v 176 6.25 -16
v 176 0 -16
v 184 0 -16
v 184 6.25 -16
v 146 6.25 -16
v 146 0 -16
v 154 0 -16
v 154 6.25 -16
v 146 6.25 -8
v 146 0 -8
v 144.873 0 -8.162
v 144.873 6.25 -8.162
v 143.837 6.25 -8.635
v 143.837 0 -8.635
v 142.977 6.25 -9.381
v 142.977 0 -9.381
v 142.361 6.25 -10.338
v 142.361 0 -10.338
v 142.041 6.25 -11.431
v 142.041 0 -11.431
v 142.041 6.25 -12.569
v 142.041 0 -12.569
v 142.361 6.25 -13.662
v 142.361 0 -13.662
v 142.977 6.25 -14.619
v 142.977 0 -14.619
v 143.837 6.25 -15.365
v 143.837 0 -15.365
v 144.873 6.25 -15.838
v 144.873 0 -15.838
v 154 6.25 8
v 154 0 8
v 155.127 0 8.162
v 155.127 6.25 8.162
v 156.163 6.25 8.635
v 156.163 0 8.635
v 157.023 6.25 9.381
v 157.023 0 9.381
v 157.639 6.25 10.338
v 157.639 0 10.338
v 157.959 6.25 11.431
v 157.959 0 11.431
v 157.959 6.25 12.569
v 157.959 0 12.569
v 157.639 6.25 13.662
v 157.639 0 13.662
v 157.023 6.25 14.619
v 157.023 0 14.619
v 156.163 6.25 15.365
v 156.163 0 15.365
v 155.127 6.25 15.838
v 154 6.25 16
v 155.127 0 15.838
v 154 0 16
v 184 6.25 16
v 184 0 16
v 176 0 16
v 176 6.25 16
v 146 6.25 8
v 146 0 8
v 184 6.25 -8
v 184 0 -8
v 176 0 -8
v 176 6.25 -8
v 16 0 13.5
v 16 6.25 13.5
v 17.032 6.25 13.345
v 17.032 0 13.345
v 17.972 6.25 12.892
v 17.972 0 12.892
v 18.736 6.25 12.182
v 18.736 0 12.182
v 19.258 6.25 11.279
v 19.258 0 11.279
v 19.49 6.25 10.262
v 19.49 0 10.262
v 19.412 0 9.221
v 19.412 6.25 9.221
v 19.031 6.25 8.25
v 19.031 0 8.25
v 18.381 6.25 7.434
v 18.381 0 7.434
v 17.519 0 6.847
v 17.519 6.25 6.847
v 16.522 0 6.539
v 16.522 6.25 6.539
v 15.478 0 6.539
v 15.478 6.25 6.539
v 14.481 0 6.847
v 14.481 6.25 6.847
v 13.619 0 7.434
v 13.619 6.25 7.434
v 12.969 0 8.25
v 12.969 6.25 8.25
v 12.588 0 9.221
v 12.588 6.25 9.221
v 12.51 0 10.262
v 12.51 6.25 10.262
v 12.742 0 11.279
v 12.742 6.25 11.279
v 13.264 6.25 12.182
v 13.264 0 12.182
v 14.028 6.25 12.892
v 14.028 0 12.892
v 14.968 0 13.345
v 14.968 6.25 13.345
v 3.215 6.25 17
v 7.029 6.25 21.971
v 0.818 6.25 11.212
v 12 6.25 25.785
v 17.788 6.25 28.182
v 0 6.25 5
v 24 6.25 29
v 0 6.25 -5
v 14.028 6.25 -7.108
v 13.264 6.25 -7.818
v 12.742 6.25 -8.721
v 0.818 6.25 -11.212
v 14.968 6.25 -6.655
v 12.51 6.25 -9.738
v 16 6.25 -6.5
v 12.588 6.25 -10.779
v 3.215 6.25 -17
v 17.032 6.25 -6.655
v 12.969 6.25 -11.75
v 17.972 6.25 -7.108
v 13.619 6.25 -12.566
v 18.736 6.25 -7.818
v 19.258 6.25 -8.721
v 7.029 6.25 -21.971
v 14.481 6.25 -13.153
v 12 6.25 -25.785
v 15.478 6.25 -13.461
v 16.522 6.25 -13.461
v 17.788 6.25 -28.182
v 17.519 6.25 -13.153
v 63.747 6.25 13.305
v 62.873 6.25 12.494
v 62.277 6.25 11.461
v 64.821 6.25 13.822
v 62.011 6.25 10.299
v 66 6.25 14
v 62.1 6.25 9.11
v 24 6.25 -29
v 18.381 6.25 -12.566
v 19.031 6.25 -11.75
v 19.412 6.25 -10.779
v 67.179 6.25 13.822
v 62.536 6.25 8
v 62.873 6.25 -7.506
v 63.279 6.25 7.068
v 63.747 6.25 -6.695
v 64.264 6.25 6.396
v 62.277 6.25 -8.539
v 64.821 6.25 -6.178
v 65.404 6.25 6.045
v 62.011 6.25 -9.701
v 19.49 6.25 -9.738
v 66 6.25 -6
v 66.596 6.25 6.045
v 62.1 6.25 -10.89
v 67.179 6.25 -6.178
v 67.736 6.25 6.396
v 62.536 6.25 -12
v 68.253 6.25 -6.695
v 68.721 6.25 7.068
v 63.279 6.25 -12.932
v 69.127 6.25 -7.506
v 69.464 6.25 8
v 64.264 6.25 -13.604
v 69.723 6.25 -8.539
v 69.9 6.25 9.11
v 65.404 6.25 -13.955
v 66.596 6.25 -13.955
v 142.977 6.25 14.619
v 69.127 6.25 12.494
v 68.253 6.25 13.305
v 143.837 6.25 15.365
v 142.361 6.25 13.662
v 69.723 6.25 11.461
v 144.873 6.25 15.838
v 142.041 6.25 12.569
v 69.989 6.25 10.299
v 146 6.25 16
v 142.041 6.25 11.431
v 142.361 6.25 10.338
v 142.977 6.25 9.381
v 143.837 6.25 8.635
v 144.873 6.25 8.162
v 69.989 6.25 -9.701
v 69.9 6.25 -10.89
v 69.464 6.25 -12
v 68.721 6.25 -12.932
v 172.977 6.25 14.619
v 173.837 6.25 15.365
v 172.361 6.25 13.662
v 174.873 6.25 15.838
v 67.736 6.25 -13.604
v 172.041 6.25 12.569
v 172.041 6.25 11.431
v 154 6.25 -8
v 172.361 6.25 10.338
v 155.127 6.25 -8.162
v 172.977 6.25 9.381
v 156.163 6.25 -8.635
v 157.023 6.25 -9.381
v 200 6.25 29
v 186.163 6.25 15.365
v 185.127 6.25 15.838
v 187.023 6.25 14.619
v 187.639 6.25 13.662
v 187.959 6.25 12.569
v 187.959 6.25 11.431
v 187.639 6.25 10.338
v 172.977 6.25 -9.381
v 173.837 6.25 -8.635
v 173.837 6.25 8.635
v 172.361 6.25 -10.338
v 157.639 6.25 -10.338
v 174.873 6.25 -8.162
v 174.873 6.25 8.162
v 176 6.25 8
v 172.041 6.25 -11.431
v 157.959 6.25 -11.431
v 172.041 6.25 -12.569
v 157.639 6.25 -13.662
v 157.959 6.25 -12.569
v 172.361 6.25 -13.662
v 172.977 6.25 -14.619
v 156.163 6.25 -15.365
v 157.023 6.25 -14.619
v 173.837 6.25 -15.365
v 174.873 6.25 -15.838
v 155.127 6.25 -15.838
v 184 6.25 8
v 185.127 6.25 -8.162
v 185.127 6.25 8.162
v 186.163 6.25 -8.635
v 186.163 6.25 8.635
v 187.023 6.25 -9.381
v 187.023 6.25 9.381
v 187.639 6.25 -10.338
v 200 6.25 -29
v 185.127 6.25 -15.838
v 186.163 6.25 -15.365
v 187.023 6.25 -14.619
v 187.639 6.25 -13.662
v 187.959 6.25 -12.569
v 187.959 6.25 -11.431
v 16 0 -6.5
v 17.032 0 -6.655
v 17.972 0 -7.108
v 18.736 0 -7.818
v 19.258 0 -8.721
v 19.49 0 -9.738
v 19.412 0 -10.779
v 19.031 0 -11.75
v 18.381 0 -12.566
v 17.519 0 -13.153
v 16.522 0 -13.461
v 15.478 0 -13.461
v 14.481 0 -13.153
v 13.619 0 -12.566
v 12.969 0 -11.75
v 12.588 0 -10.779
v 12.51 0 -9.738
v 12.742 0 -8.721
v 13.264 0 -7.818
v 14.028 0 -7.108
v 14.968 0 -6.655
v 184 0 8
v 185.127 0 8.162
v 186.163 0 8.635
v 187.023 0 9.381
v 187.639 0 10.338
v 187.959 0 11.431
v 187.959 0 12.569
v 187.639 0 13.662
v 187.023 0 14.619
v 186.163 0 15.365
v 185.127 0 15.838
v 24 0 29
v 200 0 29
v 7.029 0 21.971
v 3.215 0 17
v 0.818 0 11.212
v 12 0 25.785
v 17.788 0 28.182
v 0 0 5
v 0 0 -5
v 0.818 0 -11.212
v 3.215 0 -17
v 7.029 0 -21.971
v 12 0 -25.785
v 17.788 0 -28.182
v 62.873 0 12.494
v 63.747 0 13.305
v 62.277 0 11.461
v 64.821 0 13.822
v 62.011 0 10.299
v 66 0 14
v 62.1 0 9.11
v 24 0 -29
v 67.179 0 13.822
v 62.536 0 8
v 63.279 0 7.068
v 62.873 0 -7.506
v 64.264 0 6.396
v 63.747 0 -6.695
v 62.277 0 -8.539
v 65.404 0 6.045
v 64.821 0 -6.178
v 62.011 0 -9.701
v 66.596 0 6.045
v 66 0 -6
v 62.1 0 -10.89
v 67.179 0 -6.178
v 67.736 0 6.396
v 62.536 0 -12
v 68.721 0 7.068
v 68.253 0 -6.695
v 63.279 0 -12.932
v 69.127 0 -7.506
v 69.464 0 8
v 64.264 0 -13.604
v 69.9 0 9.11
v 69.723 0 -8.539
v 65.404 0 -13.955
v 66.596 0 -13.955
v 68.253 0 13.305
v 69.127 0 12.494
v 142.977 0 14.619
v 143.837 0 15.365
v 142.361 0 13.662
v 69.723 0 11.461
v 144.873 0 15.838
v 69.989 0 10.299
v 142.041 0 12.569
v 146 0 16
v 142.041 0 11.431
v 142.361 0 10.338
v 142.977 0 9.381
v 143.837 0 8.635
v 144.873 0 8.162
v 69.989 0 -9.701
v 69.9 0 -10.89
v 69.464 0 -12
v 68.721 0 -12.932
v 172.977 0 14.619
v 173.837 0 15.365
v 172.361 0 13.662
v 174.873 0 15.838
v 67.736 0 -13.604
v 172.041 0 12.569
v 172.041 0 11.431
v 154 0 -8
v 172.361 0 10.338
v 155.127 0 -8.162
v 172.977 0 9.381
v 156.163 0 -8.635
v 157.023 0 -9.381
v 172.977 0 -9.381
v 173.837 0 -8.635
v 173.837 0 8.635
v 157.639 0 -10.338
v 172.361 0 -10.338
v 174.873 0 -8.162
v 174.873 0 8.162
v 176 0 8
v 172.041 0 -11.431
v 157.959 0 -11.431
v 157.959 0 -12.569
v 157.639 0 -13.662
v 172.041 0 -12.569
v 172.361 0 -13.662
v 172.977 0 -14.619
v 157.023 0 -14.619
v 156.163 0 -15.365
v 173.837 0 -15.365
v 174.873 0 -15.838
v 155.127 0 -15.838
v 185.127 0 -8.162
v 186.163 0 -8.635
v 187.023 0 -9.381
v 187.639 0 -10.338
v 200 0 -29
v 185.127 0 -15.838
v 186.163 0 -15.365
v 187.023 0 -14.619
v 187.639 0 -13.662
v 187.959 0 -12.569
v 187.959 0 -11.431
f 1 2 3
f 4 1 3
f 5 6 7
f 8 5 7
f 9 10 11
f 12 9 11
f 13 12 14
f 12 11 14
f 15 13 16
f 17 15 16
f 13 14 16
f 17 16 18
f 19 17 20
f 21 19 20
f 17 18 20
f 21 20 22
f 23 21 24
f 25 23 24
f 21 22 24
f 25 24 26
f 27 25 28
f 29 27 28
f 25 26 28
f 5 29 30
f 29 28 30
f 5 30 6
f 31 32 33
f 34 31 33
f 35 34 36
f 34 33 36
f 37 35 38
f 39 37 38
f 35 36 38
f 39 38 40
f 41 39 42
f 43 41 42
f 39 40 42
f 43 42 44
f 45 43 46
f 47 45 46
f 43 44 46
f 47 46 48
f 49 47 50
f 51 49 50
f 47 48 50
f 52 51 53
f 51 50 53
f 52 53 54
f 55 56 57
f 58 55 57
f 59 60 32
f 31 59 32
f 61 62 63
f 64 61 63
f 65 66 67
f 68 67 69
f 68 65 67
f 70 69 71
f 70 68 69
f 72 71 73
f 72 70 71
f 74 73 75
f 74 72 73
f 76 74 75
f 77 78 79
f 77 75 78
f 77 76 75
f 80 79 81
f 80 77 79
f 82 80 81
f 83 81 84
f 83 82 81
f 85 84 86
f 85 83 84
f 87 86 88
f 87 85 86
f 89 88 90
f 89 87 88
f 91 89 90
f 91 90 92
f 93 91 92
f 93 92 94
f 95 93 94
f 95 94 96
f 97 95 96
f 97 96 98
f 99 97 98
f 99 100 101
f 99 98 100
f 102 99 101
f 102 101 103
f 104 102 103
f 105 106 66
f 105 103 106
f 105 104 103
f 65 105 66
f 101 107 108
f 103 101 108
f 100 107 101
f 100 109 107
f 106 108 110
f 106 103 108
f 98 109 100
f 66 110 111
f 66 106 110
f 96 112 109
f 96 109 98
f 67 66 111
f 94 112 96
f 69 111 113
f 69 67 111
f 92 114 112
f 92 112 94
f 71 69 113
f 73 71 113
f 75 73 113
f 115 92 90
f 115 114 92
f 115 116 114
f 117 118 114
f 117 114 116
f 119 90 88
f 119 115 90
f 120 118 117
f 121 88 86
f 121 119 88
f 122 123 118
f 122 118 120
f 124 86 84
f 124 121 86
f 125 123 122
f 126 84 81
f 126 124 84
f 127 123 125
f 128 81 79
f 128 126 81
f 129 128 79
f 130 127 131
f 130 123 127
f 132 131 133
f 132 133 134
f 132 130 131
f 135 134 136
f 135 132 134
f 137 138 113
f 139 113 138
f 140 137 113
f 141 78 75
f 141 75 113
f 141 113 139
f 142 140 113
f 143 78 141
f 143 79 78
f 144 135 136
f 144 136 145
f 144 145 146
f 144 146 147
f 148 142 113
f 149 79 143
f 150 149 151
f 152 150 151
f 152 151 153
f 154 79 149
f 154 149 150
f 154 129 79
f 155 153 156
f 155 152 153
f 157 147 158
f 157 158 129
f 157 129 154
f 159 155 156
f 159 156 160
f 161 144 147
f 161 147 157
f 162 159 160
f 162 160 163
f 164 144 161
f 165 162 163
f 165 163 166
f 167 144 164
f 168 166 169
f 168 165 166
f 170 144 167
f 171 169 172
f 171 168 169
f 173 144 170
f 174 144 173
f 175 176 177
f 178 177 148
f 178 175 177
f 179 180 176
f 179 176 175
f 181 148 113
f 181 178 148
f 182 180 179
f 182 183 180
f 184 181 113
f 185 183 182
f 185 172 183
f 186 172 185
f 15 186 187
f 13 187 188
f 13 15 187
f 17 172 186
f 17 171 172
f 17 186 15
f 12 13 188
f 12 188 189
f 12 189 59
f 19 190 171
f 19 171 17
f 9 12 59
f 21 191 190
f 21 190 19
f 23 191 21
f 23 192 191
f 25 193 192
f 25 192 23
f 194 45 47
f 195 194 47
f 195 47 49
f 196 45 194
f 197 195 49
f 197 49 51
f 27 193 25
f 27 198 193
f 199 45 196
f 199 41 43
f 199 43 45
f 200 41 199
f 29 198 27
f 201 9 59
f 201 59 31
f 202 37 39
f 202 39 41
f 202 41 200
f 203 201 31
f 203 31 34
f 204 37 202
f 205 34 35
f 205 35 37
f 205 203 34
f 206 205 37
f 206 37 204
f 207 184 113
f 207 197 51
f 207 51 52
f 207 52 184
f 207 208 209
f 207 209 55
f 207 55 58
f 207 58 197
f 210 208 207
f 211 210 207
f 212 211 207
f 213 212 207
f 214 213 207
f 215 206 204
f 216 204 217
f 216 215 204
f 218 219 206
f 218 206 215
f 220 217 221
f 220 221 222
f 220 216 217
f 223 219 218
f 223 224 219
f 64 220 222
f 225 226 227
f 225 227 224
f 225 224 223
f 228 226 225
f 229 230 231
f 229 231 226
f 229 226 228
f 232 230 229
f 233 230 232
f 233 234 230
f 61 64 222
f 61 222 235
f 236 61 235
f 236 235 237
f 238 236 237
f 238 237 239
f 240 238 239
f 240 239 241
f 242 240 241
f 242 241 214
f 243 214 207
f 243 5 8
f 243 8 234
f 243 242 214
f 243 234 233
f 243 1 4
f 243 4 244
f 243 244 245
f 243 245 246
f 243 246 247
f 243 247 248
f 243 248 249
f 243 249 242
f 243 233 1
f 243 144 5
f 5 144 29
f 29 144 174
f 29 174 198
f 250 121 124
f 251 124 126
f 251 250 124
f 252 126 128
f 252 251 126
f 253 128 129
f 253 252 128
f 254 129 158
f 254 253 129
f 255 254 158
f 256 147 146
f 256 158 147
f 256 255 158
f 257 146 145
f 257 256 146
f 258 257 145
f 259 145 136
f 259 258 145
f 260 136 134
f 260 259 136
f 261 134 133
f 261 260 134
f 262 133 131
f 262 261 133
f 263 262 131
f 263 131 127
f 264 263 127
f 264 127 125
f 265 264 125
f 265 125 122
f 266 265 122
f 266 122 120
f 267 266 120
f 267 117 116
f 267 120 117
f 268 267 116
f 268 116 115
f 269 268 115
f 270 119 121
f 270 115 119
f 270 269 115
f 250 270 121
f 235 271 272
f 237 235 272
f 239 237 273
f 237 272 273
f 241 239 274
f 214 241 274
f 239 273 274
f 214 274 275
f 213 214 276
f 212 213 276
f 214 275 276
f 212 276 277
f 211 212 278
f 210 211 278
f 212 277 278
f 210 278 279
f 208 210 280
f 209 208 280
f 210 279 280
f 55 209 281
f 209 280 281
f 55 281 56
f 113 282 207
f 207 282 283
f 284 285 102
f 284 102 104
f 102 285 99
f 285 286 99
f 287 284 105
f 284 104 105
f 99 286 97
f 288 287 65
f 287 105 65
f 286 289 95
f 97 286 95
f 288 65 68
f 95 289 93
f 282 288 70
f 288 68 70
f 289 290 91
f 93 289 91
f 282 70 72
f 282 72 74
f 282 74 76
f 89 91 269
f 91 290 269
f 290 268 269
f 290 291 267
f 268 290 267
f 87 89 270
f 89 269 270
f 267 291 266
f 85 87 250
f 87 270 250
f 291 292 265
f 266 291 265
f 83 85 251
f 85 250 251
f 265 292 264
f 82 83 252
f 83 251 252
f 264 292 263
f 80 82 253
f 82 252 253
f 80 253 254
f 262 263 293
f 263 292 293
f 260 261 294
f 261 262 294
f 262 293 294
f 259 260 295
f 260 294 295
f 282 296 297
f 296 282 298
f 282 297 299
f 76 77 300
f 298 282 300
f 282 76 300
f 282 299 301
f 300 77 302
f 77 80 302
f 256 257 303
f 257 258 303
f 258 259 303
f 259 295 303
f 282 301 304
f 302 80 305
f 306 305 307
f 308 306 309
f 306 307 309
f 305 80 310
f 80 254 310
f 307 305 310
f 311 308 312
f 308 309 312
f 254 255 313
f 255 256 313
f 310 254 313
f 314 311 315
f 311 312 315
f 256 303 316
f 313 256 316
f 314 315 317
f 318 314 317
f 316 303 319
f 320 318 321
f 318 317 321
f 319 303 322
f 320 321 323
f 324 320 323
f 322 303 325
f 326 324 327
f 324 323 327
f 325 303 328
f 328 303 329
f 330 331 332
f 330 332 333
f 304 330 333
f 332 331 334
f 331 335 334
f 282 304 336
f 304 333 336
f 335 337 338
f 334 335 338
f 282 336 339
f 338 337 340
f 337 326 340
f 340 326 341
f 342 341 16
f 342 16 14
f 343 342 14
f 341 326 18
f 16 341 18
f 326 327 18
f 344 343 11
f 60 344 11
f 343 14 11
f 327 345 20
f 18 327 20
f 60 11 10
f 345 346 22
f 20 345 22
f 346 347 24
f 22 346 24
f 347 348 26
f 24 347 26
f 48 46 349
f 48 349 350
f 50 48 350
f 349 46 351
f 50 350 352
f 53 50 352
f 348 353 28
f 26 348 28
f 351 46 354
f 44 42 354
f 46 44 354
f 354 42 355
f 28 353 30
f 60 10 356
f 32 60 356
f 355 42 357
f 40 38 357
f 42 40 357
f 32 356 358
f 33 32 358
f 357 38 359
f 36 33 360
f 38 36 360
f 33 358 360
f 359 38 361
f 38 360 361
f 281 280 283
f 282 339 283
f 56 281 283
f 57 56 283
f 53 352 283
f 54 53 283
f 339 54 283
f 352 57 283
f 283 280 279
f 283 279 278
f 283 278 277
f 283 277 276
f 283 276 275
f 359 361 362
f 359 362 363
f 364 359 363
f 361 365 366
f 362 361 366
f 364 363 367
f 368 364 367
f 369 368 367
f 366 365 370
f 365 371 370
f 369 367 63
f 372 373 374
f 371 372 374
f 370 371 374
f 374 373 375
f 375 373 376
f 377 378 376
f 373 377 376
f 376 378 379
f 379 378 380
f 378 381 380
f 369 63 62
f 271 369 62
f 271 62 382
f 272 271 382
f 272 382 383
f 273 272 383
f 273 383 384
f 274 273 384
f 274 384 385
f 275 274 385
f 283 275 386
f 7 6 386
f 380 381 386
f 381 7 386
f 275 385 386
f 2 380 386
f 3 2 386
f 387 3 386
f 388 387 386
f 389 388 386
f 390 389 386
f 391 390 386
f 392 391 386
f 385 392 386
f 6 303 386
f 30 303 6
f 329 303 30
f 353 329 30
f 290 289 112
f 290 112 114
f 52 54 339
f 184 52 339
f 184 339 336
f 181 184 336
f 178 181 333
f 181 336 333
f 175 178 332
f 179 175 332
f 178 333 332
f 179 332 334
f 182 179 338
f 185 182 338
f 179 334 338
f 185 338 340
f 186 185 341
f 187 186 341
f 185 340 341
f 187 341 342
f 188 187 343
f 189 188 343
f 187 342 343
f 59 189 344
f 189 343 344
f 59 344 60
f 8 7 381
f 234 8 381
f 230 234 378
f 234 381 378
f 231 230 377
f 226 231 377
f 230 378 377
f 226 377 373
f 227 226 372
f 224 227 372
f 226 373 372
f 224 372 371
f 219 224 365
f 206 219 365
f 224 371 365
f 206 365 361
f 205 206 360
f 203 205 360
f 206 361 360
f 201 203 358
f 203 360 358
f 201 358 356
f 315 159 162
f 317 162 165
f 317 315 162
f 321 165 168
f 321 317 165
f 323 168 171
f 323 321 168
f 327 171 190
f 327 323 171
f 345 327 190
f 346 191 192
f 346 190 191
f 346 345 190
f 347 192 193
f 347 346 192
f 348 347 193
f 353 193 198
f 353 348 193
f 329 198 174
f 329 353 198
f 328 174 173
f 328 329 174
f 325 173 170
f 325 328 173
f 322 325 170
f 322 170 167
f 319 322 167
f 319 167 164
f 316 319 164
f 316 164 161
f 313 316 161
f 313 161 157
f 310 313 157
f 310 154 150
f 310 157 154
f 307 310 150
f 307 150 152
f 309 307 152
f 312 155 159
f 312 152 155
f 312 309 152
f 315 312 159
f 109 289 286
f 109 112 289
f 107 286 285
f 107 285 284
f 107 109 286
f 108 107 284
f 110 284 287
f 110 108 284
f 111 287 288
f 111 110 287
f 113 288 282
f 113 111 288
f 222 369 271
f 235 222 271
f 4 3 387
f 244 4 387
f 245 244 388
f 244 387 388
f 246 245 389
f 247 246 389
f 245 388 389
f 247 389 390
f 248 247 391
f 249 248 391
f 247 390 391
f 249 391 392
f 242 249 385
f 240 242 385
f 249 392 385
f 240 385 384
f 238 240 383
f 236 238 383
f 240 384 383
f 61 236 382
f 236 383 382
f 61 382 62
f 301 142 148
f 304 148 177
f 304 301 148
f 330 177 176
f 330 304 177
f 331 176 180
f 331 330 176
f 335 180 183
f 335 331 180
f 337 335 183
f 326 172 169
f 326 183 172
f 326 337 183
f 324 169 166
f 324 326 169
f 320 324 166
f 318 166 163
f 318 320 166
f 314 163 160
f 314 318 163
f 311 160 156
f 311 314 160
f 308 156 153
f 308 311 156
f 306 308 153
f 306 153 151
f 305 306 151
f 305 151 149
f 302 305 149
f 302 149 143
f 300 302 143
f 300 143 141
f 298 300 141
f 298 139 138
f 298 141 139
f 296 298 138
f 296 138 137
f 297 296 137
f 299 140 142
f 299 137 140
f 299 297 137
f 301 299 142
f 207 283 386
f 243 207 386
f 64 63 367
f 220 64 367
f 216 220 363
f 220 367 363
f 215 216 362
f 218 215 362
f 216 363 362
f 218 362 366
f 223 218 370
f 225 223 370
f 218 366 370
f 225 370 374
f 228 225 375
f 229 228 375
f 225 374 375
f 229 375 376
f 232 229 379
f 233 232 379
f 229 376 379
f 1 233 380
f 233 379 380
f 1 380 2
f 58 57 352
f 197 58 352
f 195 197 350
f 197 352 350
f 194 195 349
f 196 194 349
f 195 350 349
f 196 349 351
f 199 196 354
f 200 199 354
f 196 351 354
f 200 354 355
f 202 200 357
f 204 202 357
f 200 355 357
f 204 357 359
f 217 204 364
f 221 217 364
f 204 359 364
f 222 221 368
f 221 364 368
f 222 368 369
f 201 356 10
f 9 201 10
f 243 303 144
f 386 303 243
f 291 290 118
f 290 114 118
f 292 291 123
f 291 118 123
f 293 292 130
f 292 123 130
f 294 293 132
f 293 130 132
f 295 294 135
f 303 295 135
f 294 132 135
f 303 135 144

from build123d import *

# Parameters (mm, degrees)
SKETCH1_W           = 200
SKETCH1_H           = 58
BOSS_EXTRUDE1_DEPTH = 6.25
SKETCH2_R           = 3.5
CUT_EXTRUDE1_DEPTH  = 203.188185857
FILLET1_R           = 24
SKETCH3_R           = 4
CUT_EXTRUDE2_DEPTH  = 10


with BuildPart() as part:
    # Sketch1 → Boss-Extrude1 (new body)
    with BuildSketch(Plane(origin=(0, 0, 0), x_dir=(1, 0, 0), z_dir=(0, 1, 0))):
        with Locations((100, 0)):
            Rectangle(SKETCH1_W, SKETCH1_H)
    extrude(amount=BOSS_EXTRUDE1_DEPTH)

    # Sketch2 → Cut-Extrude1 (cut, through all)
    with BuildSketch(Plane(origin=(0, 0, 0), x_dir=(1, 0, 0), z_dir=(0, 1, 0))):
        with Locations(Location((16, 10, 0), (0, 0, 270))):
            Circle(SKETCH2_R)
        with Locations(Location((16, -10, 0), (0, 0, 270))):
            Circle(SKETCH2_R)
        with BuildLine():
            Line((176, 16), (184, 16))
            ThreePointArc((184, 16), (188, 12), (184, 8))
            Line((184, 8), (176, 8))
            ThreePointArc((176, 8), (172, 12), (176, 16))
        make_face()
        with BuildLine():
            Line((146, 16), (154, 16))
            ThreePointArc((154, 16), (158, 12), (154, 8))
            Line((154, 8), (146, 8))
            ThreePointArc((146, 8), (142, 12), (146, 16))
        make_face()
        with BuildLine():
            Line((146, -8), (154, -8))
            ThreePointArc((154, -8), (158, -12), (154, -16))
            Line((154, -16), (146, -16))
            ThreePointArc((146, -16), (142, -12), (146, -8))
        make_face()
        with BuildLine():
            Line((176, -8), (184, -8))
            ThreePointArc((184, -8), (188, -12), (184, -16))
            Line((184, -16), (176, -16))
            ThreePointArc((176, -16), (172, -12), (176, -8))
        make_face()
    extrude(amount=CUT_EXTRUDE1_DEPTH, mode=Mode.SUBTRACT)

    # Fillet1
    fillet1_edges = [part.edges().sort_by_distance(p)[0] for p in [
        (0, 3.125, -29),
        (0, 3.125, 29),
    ]]
    fillet(fillet1_edges, radius=FILLET1_R)

    # Sketch3 → Cut-Extrude2 (cut)
    with BuildSketch(Plane(origin=(0, 0, 0), x_dir=(1, 0, 0), z_dir=(0, 1, 0))):
        with Locations(Location((66, -10, 0), (0, 0, 270))):
            Circle(SKETCH3_R)
        with Locations(Location((66, 10, 0), (0, 0, 270))):
            Circle(SKETCH3_R)
    extrude(amount=CUT_EXTRUDE2_DEPTH, mode=Mode.SUBTRACT)


solid = part.part
